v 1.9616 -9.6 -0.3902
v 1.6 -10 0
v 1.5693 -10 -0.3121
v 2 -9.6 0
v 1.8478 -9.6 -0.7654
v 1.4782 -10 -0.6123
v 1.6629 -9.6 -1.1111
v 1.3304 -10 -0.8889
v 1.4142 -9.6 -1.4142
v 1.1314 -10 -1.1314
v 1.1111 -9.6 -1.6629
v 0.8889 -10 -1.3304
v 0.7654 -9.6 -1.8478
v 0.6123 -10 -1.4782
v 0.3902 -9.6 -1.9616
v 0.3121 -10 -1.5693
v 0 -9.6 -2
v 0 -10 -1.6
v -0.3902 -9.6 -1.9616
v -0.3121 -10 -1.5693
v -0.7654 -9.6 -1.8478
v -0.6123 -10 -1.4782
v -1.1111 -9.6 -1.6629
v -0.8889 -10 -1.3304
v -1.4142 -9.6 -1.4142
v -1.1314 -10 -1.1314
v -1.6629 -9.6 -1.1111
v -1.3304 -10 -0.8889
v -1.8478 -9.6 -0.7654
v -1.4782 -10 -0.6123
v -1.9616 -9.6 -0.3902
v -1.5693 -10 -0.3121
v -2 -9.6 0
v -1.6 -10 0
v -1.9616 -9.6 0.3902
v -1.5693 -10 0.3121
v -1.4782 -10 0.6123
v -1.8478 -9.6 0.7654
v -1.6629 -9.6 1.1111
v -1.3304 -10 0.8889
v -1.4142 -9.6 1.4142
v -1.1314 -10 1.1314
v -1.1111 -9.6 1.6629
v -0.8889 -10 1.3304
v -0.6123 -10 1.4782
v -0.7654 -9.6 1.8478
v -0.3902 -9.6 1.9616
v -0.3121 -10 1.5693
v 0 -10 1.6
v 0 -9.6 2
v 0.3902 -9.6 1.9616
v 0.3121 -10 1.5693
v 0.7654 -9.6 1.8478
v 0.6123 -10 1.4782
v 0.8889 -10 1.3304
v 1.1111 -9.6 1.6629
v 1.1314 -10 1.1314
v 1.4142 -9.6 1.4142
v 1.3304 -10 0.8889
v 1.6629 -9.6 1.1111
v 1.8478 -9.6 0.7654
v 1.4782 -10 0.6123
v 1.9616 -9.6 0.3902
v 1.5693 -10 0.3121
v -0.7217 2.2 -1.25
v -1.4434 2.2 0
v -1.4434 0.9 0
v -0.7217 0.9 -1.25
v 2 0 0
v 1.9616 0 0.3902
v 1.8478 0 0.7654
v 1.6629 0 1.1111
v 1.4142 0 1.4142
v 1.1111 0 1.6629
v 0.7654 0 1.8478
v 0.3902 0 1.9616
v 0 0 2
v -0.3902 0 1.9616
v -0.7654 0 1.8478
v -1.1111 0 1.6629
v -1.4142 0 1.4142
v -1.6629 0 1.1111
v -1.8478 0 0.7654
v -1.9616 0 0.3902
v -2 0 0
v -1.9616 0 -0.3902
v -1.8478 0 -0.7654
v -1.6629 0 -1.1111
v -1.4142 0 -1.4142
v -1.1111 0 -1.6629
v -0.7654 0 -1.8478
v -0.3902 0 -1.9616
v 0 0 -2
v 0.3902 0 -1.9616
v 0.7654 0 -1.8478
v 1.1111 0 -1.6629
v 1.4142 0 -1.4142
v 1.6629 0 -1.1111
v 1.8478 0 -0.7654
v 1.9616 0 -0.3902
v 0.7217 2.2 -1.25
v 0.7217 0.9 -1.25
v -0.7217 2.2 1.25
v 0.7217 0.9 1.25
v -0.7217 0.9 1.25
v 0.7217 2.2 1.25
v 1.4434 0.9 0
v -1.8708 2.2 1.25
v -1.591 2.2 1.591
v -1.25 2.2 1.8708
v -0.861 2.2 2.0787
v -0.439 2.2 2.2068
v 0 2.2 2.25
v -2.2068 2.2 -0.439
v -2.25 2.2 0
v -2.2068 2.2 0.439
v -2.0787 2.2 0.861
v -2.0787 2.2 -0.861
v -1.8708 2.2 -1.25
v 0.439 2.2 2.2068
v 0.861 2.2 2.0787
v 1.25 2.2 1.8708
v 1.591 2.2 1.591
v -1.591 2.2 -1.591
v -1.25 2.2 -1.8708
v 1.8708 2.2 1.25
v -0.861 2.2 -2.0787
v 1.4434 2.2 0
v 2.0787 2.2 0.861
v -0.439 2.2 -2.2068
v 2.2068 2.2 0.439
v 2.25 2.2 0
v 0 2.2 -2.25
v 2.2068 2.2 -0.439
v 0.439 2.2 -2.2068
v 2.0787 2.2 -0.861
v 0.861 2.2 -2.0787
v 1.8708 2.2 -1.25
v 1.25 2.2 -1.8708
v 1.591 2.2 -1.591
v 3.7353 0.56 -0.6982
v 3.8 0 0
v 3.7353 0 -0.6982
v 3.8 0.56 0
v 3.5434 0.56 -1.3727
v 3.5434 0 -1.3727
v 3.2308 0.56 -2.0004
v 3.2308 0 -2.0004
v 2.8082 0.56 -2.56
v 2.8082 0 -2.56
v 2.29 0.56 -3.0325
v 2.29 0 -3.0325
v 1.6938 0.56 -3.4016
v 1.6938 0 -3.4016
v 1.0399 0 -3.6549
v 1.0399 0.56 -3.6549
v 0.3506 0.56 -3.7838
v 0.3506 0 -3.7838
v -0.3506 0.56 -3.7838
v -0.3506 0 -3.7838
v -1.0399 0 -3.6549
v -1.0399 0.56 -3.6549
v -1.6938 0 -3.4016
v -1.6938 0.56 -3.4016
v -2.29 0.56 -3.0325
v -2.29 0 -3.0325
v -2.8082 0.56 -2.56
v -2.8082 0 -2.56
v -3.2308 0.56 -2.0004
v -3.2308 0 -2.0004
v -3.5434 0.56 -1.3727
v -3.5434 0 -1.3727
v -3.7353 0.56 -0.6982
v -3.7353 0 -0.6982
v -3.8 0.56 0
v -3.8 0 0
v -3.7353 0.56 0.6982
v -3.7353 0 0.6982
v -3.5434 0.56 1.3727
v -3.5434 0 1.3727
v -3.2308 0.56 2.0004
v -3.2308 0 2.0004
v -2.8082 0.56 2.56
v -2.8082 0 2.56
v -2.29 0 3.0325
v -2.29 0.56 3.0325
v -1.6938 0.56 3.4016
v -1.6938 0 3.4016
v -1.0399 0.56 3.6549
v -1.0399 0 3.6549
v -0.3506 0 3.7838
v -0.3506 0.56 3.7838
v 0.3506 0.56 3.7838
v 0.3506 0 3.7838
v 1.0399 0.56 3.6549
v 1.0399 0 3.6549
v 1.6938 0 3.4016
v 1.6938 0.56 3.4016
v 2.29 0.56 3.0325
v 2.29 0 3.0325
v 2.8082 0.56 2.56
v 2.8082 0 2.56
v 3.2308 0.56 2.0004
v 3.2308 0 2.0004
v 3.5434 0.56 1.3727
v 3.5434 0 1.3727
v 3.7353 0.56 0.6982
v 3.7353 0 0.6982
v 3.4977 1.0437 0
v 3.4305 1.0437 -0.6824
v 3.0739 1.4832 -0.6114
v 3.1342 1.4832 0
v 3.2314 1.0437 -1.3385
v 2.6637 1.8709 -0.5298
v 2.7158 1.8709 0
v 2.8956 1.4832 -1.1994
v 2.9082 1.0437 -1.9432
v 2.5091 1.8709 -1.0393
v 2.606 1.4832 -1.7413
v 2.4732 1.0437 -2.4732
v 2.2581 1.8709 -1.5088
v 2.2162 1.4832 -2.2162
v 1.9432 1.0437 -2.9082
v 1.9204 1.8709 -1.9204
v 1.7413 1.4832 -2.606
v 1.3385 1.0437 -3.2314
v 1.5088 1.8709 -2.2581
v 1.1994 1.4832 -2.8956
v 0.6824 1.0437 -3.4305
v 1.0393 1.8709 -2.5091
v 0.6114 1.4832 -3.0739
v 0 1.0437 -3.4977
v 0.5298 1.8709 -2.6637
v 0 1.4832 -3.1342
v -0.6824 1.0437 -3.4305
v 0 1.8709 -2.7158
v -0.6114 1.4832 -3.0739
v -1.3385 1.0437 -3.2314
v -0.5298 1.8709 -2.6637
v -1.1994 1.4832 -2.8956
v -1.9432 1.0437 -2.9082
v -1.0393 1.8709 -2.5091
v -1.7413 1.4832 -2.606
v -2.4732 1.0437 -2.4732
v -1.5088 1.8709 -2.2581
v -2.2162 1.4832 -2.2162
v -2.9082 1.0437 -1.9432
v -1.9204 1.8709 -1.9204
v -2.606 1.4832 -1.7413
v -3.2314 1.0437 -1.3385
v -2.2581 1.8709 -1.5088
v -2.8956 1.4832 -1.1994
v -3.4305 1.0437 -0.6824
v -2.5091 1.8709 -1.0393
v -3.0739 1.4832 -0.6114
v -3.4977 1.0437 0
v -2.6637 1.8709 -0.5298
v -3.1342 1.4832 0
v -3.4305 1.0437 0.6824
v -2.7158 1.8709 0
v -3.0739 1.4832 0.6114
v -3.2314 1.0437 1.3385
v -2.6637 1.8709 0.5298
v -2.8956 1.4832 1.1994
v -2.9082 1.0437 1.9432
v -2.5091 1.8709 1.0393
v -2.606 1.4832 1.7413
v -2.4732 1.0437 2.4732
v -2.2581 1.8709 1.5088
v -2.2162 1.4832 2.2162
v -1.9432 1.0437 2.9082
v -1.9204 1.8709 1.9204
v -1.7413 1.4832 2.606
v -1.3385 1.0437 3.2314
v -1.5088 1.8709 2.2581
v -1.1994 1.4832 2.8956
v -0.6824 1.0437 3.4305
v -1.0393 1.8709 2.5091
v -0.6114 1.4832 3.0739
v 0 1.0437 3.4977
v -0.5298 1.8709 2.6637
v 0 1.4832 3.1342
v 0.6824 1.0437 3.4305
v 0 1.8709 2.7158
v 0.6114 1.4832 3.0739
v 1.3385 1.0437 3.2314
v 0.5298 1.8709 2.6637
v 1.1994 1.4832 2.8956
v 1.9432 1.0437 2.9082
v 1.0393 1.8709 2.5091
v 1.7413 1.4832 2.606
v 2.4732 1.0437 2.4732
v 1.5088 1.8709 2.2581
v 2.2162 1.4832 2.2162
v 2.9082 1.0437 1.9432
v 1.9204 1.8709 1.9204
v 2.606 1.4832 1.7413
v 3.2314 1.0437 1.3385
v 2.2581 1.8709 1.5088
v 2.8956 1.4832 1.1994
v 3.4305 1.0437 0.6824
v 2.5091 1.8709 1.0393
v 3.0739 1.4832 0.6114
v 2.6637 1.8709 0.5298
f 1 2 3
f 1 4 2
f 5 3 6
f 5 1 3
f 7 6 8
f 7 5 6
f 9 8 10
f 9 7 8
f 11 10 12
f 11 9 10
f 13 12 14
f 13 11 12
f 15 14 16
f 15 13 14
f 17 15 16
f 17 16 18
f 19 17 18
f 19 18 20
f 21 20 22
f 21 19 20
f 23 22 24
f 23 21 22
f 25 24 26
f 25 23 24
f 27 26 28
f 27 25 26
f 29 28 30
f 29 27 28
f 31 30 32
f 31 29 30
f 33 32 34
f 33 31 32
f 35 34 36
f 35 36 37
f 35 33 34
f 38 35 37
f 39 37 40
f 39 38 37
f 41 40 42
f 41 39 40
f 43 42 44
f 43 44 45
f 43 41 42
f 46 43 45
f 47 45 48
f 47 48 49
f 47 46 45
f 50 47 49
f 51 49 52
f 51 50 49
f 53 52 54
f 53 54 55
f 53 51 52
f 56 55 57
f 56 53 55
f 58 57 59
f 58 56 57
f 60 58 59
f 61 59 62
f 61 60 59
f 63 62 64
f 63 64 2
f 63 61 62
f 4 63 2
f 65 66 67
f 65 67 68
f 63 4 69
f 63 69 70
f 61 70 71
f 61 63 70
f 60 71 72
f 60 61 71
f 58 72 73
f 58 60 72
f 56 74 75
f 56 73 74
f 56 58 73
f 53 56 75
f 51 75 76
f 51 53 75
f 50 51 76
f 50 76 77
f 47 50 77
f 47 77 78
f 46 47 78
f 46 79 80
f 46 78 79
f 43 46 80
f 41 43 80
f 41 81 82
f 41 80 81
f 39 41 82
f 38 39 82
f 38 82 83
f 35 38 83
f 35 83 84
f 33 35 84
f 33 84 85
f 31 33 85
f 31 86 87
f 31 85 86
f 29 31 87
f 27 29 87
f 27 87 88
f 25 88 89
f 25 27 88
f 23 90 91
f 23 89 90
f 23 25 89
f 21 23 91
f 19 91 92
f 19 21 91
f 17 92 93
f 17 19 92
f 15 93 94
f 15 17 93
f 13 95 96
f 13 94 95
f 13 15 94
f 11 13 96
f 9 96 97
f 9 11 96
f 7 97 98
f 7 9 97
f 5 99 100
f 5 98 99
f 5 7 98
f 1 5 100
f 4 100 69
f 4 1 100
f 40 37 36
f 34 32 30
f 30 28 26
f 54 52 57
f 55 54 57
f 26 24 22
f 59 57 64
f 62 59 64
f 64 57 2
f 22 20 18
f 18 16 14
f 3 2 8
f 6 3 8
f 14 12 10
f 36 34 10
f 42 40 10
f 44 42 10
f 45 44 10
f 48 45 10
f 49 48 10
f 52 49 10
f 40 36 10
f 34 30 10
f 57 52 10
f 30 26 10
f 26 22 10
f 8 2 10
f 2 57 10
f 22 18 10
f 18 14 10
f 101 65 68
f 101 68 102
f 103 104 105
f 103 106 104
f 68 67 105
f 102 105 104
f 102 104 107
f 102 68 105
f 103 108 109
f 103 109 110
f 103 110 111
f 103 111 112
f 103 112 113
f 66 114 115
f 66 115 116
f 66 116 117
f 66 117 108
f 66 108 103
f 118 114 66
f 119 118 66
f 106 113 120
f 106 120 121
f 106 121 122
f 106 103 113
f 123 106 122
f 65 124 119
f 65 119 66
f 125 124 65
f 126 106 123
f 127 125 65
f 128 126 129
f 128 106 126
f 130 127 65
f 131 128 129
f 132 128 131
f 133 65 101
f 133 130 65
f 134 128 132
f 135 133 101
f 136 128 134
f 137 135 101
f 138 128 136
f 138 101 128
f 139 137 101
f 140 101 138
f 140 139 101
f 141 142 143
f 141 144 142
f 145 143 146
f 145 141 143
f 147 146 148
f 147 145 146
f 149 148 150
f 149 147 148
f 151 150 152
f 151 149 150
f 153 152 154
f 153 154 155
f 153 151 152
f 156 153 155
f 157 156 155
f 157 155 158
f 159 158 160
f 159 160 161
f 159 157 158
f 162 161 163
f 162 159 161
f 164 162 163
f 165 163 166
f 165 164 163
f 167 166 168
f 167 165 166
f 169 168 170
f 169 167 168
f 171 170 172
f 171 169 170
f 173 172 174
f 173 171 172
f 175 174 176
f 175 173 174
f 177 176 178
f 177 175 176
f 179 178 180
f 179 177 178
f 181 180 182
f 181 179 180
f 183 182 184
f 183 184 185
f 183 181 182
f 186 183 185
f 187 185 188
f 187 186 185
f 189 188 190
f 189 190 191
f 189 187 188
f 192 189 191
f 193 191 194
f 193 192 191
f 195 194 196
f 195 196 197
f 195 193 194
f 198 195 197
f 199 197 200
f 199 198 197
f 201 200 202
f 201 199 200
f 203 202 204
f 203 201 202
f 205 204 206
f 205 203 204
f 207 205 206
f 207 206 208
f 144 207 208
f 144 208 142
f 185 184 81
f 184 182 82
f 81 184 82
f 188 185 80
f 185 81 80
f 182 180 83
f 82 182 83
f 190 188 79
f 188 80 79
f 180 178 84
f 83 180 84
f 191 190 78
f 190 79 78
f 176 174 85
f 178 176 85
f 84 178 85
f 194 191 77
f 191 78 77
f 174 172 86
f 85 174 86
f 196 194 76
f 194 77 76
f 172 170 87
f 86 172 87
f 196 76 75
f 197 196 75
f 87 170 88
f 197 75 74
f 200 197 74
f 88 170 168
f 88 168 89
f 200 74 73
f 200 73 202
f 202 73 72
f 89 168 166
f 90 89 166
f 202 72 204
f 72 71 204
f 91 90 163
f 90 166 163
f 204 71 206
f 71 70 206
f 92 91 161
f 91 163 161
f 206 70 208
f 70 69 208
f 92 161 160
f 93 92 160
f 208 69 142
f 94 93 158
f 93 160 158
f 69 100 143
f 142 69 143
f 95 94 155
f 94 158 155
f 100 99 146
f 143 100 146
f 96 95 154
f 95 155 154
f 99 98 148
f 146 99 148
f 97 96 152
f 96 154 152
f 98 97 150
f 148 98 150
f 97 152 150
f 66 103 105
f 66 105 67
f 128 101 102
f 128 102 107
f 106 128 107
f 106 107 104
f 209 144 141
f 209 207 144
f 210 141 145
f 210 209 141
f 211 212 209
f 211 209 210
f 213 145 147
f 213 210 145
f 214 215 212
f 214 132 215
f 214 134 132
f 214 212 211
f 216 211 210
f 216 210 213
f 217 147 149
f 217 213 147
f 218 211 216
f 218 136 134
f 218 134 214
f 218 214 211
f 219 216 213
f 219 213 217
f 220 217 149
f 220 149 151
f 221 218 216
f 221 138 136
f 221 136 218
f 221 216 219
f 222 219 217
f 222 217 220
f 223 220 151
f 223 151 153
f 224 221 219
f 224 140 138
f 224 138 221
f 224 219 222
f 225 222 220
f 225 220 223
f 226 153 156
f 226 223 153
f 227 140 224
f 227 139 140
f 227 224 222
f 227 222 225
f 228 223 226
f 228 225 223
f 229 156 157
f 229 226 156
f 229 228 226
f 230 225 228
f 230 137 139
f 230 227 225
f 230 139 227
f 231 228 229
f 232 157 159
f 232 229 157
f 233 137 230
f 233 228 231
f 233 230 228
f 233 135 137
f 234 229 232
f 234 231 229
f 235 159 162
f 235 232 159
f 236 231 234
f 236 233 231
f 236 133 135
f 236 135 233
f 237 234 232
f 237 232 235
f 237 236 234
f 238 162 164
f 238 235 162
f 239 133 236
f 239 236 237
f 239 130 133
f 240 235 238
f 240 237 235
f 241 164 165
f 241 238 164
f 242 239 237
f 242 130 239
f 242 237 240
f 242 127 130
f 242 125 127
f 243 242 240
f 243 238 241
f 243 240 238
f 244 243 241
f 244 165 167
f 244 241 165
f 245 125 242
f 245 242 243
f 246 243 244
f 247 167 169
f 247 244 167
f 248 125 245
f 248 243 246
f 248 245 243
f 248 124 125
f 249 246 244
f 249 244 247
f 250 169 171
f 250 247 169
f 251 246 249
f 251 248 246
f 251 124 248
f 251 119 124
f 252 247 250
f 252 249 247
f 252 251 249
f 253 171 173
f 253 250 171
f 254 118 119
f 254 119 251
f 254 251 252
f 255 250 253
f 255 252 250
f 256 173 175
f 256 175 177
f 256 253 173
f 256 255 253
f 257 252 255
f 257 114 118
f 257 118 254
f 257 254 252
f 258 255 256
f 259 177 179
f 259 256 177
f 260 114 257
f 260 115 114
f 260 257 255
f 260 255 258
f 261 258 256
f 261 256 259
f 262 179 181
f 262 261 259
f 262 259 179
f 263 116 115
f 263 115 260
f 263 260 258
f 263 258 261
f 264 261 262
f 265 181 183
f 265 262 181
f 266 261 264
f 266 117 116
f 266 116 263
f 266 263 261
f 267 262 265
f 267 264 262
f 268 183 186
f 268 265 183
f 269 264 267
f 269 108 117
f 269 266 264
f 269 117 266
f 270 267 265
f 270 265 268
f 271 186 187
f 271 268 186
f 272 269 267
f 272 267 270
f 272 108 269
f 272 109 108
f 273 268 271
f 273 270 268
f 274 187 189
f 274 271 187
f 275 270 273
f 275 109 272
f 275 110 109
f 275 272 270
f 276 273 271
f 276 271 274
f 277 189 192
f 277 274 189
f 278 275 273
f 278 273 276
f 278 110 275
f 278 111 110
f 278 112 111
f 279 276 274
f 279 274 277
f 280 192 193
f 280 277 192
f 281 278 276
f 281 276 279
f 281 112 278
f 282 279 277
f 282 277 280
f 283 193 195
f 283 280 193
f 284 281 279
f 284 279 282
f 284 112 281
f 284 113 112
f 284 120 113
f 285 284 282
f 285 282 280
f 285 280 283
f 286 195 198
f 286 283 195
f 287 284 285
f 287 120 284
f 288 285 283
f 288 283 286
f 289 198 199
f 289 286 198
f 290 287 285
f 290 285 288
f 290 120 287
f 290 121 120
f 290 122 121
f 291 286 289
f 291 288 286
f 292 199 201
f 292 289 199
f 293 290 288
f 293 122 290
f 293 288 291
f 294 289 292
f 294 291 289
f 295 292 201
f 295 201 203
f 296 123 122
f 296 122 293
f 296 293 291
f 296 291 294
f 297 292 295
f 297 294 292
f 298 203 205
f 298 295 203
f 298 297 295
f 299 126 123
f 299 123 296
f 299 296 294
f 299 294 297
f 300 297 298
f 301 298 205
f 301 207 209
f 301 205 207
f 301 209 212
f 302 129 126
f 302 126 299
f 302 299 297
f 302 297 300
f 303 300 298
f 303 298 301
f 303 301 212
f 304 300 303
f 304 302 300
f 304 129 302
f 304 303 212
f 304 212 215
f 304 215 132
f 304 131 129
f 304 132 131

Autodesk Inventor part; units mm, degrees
ref_plane "YZ Plane" through (0, 0, 0) normal (1, 0, 0) x (0, 1, 0)
ref_plane "XZ Plane" through (0, 0, 0) normal (0, 1, 0) x (-1, 0, 0)
ref_plane "XY Plane" through (0, 0, 0) normal (0, 0, 1) x (1, 0, 0)
sketch "Sketch1" plane through (0, 0, 0) normal (0, 0, 1) x (1, 0, 0)
  line L0 (0, -22.0606) -> (0, 6.3638) projected
  line L1 (0, 2.2) -> (2.25, 2.2)
  line L2 (3.8, 0) -> (3.8, 0.56)
  arc A0 (3.8, 0.56) -> (2.25, 2.2) centre (0, -1.479) ccw
  line L3 (3.8, 0) -> (2, 0)
  line L4 (2, 0) -> (2, -10)
  line L5 (2, -10) -> (0, -10)
  point P0 (0, 0)
  dimension "BoltDia" = 4
  dimension "HeadDia" = 7.6
  dimension "HeadHeight" = 2.2
  dimension "SideHeight" = 0.56
  dimension "TopFlatDia" = 4.5
  dimension "Length" = 10
revolve "Revolution1" add sketch "Sketch1" angle 360 about axis through (0, -10, 0) along (0, 1, 0)
sketch "Sketch2" plane through (0, 2.2, 0) normal (0, 1, 0) x (1, 0, 0)
  circle A0 centre (0, 0) radius 2.25 projected
  circle A1 centre (0, 0) radius 1.25 construction
  line L0 (-0.7217, 1.25) -> (0.7217, 1.25)
  line L1 (0.7217, 1.25) -> (1.4434, 0)
  line L2 (1.4434, 0) -> (0.7217, -1.25)
  line L3 (0.7217, -1.25) -> (-0.7217, -1.25)
  line L4 (-0.7217, -1.25) -> (-1.4434, 0)
  line L5 (-1.4434, 0) -> (-0.7217, 1.25)
  dimension "HexSize" = 2.5
extrude "Hex" cut sketch "Sketch2" against normal blind 1.3 contours L0 L1 L2 L3 L4 L5
thread "Thread1" size "M4x0.7" class "4g6g" standard "ANSI Metric M Profile" full length
chamfer "Chamfer1" distance 0.4 angle 45 1 edges at (-2, -10, 0)
equation "\"d11\" = 0.1 * BoltDia"
equation "\"d12\" = 0.1 * BoltDia"
equation "\"d17\" = HexSize"
properties part number "SCREW, BUTTON HD, P, 12.9, M4X0.7X18MM" material "Steel"
